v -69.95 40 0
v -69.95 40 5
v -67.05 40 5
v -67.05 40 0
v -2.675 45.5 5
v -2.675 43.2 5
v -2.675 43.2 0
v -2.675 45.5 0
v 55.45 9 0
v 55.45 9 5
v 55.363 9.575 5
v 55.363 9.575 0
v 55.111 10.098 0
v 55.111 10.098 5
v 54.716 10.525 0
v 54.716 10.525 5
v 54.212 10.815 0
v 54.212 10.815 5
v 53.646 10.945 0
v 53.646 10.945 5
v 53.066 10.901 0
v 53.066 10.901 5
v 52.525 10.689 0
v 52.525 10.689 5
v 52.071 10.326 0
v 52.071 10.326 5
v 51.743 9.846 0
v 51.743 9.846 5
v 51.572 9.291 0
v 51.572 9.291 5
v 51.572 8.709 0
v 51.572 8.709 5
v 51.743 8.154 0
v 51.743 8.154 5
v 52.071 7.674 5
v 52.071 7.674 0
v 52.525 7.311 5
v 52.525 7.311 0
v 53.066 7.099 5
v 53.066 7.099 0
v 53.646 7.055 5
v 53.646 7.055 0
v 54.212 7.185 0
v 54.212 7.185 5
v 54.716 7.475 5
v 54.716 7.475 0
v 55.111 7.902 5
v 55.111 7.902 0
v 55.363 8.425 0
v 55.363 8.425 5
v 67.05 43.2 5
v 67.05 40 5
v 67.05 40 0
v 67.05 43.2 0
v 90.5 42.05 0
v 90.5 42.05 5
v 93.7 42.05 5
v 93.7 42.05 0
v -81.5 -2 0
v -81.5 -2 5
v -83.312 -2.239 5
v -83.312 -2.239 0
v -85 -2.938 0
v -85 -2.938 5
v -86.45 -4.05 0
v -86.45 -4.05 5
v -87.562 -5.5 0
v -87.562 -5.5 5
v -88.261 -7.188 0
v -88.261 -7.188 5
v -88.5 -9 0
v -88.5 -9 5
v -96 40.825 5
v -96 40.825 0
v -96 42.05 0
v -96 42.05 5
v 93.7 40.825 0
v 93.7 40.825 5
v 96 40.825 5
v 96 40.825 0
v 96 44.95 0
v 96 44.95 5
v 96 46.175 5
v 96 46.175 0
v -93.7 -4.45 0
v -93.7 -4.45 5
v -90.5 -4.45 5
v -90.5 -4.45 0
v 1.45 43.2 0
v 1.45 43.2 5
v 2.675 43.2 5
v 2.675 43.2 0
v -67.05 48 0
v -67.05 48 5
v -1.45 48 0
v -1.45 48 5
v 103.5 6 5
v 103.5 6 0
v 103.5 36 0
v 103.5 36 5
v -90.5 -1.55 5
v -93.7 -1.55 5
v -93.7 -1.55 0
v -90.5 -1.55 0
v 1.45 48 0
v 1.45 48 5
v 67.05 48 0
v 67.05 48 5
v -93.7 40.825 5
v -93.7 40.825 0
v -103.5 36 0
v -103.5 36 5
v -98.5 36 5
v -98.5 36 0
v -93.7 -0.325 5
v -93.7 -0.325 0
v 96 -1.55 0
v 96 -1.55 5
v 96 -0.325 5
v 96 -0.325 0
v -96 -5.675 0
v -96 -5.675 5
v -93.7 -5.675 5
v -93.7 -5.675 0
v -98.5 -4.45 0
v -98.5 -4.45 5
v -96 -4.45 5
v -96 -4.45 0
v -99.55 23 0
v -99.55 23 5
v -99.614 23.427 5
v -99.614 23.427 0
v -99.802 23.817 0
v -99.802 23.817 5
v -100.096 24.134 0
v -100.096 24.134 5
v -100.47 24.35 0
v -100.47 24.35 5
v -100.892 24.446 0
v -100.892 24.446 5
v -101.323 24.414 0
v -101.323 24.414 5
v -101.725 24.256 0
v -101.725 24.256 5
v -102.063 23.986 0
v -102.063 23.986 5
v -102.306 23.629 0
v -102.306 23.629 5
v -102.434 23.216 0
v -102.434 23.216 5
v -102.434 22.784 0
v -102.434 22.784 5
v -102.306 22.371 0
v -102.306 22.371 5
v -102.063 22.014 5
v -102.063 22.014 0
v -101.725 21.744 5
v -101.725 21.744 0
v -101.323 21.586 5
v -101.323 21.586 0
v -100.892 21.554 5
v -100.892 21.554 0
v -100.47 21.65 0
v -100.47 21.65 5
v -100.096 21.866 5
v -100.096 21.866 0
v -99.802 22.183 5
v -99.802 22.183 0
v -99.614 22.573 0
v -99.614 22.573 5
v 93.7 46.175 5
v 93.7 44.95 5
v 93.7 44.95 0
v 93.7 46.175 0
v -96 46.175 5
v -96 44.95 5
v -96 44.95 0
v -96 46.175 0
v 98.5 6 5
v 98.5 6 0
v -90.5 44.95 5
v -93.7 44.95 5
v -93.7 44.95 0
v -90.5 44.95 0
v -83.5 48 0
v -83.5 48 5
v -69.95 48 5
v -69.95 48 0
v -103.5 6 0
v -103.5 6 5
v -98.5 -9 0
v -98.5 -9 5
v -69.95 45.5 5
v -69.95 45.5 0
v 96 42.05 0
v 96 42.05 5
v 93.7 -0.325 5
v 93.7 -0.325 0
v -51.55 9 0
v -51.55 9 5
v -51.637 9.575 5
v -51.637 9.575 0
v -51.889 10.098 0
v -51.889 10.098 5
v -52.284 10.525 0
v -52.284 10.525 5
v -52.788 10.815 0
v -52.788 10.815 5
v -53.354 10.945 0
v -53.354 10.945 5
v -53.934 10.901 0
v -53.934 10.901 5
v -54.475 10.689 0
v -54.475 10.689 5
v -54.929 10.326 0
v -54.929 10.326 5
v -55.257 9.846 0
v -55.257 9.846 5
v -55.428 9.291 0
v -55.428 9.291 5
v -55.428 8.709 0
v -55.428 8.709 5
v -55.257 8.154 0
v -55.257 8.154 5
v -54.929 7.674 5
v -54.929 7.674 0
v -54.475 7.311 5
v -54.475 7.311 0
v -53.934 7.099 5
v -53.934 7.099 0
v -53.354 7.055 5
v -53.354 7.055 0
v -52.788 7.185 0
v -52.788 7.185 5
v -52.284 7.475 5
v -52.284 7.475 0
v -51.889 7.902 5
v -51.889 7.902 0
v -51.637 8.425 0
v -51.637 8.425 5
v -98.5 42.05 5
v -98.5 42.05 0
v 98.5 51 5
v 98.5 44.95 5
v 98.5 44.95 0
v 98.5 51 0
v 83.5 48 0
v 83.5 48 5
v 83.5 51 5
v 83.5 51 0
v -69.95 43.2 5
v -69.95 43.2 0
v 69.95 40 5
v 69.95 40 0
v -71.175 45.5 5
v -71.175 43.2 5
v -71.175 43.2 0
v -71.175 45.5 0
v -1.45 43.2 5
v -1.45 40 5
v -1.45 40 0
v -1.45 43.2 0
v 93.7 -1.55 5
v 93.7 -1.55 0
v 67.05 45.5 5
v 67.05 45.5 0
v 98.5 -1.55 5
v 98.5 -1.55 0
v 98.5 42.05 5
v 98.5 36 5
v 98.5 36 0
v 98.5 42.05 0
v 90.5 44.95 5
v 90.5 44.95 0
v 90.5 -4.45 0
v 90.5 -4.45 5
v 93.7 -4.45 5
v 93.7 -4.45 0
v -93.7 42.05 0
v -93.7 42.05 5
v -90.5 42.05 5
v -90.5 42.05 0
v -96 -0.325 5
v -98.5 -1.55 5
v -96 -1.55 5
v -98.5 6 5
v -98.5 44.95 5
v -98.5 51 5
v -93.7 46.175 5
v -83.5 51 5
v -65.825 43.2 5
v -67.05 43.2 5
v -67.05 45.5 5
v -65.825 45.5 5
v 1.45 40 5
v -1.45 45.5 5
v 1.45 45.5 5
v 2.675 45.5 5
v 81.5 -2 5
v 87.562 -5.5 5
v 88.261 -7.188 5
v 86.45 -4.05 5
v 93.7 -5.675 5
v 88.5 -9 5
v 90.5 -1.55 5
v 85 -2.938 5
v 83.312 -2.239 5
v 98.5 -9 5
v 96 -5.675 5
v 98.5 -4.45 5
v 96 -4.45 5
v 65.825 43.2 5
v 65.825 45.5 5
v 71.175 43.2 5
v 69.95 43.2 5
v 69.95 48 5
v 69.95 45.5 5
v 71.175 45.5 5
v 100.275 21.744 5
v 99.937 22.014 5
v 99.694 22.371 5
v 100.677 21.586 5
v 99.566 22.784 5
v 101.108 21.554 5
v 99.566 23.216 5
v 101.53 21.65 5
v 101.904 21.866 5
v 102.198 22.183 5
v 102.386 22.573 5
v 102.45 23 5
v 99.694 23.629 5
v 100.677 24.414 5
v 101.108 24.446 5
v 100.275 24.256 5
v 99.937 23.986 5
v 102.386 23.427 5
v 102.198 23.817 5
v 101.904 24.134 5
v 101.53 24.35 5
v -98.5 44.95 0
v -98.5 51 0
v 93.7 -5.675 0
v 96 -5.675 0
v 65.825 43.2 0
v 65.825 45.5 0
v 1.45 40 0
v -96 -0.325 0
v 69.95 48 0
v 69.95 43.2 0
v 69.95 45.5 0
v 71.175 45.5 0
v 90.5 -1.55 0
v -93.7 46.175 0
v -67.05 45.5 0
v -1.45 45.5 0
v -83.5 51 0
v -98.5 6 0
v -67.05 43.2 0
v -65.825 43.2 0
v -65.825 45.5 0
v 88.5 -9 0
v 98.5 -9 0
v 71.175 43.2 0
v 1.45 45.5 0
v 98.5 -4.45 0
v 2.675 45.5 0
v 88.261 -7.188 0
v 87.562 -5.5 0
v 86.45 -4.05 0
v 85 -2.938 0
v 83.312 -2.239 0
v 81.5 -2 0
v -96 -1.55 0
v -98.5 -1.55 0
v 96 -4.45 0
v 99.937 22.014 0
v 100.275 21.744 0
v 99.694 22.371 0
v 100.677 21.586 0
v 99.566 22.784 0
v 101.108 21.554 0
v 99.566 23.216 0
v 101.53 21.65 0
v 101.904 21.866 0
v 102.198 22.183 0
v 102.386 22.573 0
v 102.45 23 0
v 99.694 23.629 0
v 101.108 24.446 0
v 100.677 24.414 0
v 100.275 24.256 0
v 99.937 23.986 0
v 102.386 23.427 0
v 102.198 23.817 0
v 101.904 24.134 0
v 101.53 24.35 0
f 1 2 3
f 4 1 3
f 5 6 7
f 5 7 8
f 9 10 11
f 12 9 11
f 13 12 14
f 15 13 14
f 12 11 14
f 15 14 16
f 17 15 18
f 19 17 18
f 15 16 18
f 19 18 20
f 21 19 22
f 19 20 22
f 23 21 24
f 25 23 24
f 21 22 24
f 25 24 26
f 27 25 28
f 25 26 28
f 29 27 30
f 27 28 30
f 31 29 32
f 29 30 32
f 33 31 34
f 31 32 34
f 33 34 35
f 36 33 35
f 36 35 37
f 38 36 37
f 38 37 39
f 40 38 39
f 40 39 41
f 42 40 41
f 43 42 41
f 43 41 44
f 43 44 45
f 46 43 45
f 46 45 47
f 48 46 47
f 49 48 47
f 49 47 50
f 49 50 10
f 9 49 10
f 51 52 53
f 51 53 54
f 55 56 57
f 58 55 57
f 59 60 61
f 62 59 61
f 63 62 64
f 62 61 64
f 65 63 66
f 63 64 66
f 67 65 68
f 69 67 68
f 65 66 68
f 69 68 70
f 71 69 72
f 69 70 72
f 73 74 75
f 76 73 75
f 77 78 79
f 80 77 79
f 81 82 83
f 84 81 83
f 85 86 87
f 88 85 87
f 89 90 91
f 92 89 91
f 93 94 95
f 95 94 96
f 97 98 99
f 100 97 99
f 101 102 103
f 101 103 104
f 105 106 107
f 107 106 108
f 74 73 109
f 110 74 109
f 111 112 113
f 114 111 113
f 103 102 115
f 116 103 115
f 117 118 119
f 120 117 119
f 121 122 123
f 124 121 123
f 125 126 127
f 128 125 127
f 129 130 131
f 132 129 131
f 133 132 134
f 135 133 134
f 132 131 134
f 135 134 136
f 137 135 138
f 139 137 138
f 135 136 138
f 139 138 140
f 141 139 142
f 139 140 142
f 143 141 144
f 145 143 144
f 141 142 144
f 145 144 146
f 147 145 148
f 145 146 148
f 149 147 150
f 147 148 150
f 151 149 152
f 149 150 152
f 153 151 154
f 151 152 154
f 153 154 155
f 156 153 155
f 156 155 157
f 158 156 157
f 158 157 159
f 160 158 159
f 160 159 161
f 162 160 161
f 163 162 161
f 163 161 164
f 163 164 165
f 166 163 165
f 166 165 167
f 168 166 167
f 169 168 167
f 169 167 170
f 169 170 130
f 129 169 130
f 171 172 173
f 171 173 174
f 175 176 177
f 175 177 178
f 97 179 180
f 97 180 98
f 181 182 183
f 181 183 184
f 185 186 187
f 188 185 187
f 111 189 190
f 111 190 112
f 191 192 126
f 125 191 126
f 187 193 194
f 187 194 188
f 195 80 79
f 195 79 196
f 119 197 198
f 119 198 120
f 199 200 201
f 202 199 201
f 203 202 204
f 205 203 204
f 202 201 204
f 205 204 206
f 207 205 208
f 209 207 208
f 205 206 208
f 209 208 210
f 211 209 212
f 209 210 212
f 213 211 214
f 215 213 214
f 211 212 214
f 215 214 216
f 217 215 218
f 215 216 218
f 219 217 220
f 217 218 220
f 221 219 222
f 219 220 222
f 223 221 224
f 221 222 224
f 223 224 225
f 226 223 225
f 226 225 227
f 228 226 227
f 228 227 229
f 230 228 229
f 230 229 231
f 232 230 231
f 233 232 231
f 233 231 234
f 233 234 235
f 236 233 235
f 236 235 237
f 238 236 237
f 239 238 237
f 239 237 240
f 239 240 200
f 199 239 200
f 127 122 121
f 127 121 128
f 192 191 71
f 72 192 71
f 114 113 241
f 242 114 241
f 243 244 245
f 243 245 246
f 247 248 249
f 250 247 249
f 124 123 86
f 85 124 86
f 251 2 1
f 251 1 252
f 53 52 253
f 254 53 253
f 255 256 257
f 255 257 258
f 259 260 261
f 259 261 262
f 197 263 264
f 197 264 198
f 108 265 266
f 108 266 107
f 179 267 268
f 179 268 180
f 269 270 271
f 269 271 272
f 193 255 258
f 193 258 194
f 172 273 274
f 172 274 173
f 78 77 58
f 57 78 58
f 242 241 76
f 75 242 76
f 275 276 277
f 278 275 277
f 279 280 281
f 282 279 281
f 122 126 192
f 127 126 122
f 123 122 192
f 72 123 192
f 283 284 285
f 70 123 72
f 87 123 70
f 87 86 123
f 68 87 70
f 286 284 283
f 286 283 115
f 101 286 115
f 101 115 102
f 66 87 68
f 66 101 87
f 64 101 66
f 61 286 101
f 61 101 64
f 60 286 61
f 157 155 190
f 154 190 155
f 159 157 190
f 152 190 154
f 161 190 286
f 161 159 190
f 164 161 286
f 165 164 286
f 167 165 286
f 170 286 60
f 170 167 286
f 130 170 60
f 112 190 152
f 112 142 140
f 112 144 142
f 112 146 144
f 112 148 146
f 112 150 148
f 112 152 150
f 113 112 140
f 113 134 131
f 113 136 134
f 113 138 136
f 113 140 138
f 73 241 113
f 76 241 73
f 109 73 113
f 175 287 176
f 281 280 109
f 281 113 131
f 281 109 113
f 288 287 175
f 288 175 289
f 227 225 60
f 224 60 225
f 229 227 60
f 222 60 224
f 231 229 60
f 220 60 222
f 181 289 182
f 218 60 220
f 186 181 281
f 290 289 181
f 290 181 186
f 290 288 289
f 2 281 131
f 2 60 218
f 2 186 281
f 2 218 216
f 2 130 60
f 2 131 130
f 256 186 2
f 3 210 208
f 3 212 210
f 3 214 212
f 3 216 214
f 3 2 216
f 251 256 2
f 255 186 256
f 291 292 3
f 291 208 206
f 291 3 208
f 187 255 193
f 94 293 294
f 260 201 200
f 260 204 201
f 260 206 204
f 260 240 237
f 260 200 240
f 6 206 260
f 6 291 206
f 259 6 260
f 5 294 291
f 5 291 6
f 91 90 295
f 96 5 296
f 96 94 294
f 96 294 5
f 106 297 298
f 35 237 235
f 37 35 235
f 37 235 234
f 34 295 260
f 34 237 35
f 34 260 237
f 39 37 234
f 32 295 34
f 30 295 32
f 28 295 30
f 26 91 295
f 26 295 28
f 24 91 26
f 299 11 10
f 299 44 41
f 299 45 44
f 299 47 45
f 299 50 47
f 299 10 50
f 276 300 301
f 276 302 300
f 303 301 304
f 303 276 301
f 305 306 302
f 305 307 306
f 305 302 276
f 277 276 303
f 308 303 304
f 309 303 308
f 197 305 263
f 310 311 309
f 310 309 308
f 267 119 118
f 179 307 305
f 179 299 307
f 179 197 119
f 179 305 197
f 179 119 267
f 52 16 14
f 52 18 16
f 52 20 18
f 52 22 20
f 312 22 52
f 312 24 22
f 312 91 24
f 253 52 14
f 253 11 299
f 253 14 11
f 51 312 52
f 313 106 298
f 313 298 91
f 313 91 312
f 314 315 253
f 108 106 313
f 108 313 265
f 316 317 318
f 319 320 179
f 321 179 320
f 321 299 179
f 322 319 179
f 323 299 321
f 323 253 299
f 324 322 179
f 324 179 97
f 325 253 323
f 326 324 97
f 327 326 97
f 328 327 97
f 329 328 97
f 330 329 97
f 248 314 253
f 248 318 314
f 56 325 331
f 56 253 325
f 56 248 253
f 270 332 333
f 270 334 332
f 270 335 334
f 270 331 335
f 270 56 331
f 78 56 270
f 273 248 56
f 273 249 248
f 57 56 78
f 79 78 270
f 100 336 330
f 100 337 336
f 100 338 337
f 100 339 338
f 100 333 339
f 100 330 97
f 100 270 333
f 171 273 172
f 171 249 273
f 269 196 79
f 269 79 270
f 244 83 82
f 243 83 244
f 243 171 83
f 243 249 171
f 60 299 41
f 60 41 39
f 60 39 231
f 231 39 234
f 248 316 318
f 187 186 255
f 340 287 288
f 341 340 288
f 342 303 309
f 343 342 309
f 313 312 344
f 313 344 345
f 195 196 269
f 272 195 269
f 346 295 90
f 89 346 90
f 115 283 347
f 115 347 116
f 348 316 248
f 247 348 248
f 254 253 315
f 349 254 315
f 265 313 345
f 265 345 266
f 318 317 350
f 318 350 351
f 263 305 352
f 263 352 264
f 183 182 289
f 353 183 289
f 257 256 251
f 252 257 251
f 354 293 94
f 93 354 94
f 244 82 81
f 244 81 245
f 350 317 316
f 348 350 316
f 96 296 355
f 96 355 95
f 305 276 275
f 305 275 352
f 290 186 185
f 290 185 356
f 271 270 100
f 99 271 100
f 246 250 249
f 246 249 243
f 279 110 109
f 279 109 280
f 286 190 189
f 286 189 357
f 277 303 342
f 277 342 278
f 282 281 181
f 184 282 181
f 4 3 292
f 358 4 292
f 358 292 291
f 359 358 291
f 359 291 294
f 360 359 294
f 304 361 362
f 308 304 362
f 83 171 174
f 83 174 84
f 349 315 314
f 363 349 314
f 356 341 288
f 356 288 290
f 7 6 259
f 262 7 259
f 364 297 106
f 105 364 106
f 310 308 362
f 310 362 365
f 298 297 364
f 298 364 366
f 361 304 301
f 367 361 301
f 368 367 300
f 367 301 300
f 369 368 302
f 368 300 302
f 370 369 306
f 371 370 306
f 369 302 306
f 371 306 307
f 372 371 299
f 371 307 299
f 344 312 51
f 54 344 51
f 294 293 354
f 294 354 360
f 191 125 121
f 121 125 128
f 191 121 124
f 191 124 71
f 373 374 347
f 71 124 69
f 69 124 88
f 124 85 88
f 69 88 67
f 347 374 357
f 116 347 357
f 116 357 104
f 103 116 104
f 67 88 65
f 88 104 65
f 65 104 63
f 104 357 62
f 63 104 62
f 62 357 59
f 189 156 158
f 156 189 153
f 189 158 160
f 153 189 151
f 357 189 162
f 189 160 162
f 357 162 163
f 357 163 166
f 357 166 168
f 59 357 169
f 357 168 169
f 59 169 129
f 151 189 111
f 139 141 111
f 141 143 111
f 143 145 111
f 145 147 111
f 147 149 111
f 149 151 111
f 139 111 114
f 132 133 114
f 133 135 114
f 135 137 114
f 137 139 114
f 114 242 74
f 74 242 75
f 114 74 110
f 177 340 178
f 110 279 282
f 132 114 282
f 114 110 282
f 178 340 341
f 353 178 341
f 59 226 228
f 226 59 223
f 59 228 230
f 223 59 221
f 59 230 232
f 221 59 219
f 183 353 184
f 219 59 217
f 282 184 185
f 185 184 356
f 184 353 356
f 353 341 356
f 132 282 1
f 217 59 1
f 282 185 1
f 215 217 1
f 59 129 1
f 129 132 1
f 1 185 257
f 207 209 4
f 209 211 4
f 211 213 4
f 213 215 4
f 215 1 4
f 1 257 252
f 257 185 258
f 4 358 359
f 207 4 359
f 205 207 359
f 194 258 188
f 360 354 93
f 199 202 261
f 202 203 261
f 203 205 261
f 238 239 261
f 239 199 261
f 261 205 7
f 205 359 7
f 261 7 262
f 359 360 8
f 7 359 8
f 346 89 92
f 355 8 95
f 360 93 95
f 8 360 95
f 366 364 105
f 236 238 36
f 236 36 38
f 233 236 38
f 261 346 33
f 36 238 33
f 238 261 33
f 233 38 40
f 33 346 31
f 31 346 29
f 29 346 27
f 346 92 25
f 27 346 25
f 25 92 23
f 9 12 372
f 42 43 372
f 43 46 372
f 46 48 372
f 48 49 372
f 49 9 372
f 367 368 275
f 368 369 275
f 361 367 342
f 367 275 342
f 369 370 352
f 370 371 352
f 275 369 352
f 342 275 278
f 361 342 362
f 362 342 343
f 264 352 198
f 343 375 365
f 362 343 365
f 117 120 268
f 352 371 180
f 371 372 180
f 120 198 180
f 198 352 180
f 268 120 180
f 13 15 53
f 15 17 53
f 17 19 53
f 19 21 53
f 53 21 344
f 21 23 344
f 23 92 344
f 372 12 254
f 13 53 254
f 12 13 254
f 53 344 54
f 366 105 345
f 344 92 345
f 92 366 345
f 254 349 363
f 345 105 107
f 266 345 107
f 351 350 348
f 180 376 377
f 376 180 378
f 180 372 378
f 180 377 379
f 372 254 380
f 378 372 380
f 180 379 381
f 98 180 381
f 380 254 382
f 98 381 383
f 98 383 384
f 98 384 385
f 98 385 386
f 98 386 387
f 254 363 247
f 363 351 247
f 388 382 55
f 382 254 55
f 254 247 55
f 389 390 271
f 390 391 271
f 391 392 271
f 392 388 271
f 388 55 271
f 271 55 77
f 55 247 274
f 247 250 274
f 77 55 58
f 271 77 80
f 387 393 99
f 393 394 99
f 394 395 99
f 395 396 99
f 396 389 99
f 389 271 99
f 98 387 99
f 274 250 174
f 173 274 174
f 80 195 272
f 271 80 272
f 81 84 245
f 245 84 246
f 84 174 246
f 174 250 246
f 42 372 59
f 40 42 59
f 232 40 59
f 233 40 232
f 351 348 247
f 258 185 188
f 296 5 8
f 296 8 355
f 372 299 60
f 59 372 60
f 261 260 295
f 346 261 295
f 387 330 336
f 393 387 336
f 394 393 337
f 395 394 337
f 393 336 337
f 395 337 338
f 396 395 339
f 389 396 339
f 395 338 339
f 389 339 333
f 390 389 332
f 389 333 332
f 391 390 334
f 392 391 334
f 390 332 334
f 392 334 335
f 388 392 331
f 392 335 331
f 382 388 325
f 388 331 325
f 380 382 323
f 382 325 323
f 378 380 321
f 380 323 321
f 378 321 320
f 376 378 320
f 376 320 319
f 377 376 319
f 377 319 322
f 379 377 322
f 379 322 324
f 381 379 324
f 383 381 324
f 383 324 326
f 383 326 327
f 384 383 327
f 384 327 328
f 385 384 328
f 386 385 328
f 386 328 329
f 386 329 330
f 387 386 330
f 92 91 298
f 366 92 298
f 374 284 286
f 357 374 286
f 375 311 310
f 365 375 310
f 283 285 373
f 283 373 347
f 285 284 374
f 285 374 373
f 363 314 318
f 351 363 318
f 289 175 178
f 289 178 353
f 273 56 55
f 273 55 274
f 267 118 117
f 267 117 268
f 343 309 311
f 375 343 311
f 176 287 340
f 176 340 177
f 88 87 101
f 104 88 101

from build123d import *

# Parameters (mm, degrees)
SKETCH1_W           = 207
SKETCH1_H           = 60
BOSS_EXTRUDE1_DEPTH = 5
SKETCH2_W           = 5
SKETCH2_H           = 15
CUT_EXTRUDE1_DEPTH  = 116.491341667
SKETCH3_W           = 167
SKETCH3_H           = 3
CUT_EXTRUDE2_DEPTH  = 5
SKETCH4_R           = 1.45
SKETCH4_R_2         = 1.95
SKETCH4_W           = 8
SKETCH4_H           = 2.9
SKETCH4_W_2         = 2.3
SKETCH4_H_2         = 5.35
SKETCH4_W_3         = 5.35
SKETCH4_H_3         = 2.3
SKETCH4_W_4         = 2.9
SKETCH4_H_4         = 8
CUT_EXTRUDE3_DEPTH  = 116.491341667


with BuildPart() as part:
    # Sketch1 → Boss-Extrude1 (new body)
    with BuildSketch(Plane.XY):
        with Locations((0, 21)):
            Rectangle(SKETCH1_W, SKETCH1_H)
    extrude(amount=BOSS_EXTRUDE1_DEPTH)

    # Sketch2 → Cut-Extrude1 (cut, through all)
    with BuildSketch(Plane.XY.offset(5)):
        with Locations((-101, 43.5)):
            Rectangle(SKETCH2_W, SKETCH2_H)
        with Locations((-101, -1.5)):
            Rectangle(SKETCH2_W, SKETCH2_H)
        with Locations((101, 43.5)):
            Rectangle(SKETCH2_W, SKETCH2_H)
        with Locations((101, -1.5)):
            Rectangle(SKETCH2_W, SKETCH2_H)
    extrude(amount=-CUT_EXTRUDE1_DEPTH, mode=Mode.SUBTRACT)

    # Sketch3 → Cut-Extrude2 (cut)
    with BuildSketch(Plane.XY.offset(5)):
        with Locations((0, 49.5)):
            Rectangle(SKETCH3_W, SKETCH3_H)
        with BuildLine():
            ThreePointArc((-81.5, -2), (-76.550252532, -4.050252532), (-74.5, -9))
            Line((-74.5, -9), (74.5, -9))
            ThreePointArc((74.5, -9), (76.550252532, -4.050252532), (81.5, -2))
            Line((81.5, -2), (-81.5, -2))
        make_face()
        with BuildLine():
            Line((-81.5, -2), (-81.5, -9))
            Line((-81.5, -9), (-74.5, -9))
            ThreePointArc((-74.5, -9), (-76.550252532, -4.050252532), (-81.5, -2))
        make_face()
        with BuildLine():
            Line((-88.5, -9), (-81.5, -9))
            Line((-81.5, -9), (-81.5, -2))
            ThreePointArc((-81.5, -2), (-86.449747468, -4.050252532), (-88.5, -9))
        make_face()
        with BuildLine():
            ThreePointArc((81.5, -2), (76.550252532, -4.050252532), (74.5, -9))
            Line((74.5, -9), (81.5, -9))
            Line((81.5, -9), (81.5, -2))
        make_face()
        with BuildLine():
            ThreePointArc((88.5, -9), (86.449747468, -4.050252532), (81.5, -2))
            Line((81.5, -2), (81.5, -9))
            Line((81.5, -9), (88.5, -9))
        make_face()
    extrude(amount=-CUT_EXTRUDE2_DEPTH, mode=Mode.SUBTRACT)

    # Sketch4 → Cut-Extrude3 (cut, through all)
    with BuildSketch(Plane.XY.offset(5)):
        with Locations((101, 23)):
            Circle(SKETCH4_R)
        with Locations((-101, 23)):
            Circle(SKETCH4_R)
        with Locations((-53.5, 9)):
            Circle(SKETCH4_R_2)
        with Locations((53.5, 9)):
            Circle(SKETCH4_R_2)
        with Locations((94.5, 43.5)):
            Rectangle(SKETCH4_W, SKETCH4_H)
        with Locations((94.5, -3)):
            Rectangle(SKETCH4_W, SKETCH4_H)
        with Locations((94.85, 43.5)):
            Rectangle(SKETCH4_W_2, SKETCH4_H_2)
        with Locations((94.85, -3)):
            Rectangle(SKETCH4_W_2, SKETCH4_H_2)
        with Locations((-94.85, -3)):
            Rectangle(SKETCH4_W_2, SKETCH4_H_2)
        with Locations((68.5, 44.35)):
            Rectangle(SKETCH4_W_3, SKETCH4_H_3)
        with Locations((68.5, 44)):
            Rectangle(SKETCH4_W_4, SKETCH4_H_4)
        with Locations((-94.5, 43.5)):
            Rectangle(SKETCH4_W, SKETCH4_H)
        with Locations((-94.85, 43.5)):
            Rectangle(SKETCH4_W_2, SKETCH4_H_2)
        with Locations((-94.5, -3)):
            Rectangle(SKETCH4_W, SKETCH4_H)
        with Locations((0, 44.35)):
            Rectangle(SKETCH4_W_3, SKETCH4_H_3)
        with Locations((0, 44)):
            Rectangle(SKETCH4_W_4, SKETCH4_H_4)
        with Locations((-68.5, 44)):
            Rectangle(SKETCH4_W_4, SKETCH4_H_4)
        with Locations((-68.5, 44.35)):
            Rectangle(SKETCH4_W_3, SKETCH4_H_3)
    extrude(amount=-CUT_EXTRUDE3_DEPTH, mode=Mode.SUBTRACT)


solid = part.part
